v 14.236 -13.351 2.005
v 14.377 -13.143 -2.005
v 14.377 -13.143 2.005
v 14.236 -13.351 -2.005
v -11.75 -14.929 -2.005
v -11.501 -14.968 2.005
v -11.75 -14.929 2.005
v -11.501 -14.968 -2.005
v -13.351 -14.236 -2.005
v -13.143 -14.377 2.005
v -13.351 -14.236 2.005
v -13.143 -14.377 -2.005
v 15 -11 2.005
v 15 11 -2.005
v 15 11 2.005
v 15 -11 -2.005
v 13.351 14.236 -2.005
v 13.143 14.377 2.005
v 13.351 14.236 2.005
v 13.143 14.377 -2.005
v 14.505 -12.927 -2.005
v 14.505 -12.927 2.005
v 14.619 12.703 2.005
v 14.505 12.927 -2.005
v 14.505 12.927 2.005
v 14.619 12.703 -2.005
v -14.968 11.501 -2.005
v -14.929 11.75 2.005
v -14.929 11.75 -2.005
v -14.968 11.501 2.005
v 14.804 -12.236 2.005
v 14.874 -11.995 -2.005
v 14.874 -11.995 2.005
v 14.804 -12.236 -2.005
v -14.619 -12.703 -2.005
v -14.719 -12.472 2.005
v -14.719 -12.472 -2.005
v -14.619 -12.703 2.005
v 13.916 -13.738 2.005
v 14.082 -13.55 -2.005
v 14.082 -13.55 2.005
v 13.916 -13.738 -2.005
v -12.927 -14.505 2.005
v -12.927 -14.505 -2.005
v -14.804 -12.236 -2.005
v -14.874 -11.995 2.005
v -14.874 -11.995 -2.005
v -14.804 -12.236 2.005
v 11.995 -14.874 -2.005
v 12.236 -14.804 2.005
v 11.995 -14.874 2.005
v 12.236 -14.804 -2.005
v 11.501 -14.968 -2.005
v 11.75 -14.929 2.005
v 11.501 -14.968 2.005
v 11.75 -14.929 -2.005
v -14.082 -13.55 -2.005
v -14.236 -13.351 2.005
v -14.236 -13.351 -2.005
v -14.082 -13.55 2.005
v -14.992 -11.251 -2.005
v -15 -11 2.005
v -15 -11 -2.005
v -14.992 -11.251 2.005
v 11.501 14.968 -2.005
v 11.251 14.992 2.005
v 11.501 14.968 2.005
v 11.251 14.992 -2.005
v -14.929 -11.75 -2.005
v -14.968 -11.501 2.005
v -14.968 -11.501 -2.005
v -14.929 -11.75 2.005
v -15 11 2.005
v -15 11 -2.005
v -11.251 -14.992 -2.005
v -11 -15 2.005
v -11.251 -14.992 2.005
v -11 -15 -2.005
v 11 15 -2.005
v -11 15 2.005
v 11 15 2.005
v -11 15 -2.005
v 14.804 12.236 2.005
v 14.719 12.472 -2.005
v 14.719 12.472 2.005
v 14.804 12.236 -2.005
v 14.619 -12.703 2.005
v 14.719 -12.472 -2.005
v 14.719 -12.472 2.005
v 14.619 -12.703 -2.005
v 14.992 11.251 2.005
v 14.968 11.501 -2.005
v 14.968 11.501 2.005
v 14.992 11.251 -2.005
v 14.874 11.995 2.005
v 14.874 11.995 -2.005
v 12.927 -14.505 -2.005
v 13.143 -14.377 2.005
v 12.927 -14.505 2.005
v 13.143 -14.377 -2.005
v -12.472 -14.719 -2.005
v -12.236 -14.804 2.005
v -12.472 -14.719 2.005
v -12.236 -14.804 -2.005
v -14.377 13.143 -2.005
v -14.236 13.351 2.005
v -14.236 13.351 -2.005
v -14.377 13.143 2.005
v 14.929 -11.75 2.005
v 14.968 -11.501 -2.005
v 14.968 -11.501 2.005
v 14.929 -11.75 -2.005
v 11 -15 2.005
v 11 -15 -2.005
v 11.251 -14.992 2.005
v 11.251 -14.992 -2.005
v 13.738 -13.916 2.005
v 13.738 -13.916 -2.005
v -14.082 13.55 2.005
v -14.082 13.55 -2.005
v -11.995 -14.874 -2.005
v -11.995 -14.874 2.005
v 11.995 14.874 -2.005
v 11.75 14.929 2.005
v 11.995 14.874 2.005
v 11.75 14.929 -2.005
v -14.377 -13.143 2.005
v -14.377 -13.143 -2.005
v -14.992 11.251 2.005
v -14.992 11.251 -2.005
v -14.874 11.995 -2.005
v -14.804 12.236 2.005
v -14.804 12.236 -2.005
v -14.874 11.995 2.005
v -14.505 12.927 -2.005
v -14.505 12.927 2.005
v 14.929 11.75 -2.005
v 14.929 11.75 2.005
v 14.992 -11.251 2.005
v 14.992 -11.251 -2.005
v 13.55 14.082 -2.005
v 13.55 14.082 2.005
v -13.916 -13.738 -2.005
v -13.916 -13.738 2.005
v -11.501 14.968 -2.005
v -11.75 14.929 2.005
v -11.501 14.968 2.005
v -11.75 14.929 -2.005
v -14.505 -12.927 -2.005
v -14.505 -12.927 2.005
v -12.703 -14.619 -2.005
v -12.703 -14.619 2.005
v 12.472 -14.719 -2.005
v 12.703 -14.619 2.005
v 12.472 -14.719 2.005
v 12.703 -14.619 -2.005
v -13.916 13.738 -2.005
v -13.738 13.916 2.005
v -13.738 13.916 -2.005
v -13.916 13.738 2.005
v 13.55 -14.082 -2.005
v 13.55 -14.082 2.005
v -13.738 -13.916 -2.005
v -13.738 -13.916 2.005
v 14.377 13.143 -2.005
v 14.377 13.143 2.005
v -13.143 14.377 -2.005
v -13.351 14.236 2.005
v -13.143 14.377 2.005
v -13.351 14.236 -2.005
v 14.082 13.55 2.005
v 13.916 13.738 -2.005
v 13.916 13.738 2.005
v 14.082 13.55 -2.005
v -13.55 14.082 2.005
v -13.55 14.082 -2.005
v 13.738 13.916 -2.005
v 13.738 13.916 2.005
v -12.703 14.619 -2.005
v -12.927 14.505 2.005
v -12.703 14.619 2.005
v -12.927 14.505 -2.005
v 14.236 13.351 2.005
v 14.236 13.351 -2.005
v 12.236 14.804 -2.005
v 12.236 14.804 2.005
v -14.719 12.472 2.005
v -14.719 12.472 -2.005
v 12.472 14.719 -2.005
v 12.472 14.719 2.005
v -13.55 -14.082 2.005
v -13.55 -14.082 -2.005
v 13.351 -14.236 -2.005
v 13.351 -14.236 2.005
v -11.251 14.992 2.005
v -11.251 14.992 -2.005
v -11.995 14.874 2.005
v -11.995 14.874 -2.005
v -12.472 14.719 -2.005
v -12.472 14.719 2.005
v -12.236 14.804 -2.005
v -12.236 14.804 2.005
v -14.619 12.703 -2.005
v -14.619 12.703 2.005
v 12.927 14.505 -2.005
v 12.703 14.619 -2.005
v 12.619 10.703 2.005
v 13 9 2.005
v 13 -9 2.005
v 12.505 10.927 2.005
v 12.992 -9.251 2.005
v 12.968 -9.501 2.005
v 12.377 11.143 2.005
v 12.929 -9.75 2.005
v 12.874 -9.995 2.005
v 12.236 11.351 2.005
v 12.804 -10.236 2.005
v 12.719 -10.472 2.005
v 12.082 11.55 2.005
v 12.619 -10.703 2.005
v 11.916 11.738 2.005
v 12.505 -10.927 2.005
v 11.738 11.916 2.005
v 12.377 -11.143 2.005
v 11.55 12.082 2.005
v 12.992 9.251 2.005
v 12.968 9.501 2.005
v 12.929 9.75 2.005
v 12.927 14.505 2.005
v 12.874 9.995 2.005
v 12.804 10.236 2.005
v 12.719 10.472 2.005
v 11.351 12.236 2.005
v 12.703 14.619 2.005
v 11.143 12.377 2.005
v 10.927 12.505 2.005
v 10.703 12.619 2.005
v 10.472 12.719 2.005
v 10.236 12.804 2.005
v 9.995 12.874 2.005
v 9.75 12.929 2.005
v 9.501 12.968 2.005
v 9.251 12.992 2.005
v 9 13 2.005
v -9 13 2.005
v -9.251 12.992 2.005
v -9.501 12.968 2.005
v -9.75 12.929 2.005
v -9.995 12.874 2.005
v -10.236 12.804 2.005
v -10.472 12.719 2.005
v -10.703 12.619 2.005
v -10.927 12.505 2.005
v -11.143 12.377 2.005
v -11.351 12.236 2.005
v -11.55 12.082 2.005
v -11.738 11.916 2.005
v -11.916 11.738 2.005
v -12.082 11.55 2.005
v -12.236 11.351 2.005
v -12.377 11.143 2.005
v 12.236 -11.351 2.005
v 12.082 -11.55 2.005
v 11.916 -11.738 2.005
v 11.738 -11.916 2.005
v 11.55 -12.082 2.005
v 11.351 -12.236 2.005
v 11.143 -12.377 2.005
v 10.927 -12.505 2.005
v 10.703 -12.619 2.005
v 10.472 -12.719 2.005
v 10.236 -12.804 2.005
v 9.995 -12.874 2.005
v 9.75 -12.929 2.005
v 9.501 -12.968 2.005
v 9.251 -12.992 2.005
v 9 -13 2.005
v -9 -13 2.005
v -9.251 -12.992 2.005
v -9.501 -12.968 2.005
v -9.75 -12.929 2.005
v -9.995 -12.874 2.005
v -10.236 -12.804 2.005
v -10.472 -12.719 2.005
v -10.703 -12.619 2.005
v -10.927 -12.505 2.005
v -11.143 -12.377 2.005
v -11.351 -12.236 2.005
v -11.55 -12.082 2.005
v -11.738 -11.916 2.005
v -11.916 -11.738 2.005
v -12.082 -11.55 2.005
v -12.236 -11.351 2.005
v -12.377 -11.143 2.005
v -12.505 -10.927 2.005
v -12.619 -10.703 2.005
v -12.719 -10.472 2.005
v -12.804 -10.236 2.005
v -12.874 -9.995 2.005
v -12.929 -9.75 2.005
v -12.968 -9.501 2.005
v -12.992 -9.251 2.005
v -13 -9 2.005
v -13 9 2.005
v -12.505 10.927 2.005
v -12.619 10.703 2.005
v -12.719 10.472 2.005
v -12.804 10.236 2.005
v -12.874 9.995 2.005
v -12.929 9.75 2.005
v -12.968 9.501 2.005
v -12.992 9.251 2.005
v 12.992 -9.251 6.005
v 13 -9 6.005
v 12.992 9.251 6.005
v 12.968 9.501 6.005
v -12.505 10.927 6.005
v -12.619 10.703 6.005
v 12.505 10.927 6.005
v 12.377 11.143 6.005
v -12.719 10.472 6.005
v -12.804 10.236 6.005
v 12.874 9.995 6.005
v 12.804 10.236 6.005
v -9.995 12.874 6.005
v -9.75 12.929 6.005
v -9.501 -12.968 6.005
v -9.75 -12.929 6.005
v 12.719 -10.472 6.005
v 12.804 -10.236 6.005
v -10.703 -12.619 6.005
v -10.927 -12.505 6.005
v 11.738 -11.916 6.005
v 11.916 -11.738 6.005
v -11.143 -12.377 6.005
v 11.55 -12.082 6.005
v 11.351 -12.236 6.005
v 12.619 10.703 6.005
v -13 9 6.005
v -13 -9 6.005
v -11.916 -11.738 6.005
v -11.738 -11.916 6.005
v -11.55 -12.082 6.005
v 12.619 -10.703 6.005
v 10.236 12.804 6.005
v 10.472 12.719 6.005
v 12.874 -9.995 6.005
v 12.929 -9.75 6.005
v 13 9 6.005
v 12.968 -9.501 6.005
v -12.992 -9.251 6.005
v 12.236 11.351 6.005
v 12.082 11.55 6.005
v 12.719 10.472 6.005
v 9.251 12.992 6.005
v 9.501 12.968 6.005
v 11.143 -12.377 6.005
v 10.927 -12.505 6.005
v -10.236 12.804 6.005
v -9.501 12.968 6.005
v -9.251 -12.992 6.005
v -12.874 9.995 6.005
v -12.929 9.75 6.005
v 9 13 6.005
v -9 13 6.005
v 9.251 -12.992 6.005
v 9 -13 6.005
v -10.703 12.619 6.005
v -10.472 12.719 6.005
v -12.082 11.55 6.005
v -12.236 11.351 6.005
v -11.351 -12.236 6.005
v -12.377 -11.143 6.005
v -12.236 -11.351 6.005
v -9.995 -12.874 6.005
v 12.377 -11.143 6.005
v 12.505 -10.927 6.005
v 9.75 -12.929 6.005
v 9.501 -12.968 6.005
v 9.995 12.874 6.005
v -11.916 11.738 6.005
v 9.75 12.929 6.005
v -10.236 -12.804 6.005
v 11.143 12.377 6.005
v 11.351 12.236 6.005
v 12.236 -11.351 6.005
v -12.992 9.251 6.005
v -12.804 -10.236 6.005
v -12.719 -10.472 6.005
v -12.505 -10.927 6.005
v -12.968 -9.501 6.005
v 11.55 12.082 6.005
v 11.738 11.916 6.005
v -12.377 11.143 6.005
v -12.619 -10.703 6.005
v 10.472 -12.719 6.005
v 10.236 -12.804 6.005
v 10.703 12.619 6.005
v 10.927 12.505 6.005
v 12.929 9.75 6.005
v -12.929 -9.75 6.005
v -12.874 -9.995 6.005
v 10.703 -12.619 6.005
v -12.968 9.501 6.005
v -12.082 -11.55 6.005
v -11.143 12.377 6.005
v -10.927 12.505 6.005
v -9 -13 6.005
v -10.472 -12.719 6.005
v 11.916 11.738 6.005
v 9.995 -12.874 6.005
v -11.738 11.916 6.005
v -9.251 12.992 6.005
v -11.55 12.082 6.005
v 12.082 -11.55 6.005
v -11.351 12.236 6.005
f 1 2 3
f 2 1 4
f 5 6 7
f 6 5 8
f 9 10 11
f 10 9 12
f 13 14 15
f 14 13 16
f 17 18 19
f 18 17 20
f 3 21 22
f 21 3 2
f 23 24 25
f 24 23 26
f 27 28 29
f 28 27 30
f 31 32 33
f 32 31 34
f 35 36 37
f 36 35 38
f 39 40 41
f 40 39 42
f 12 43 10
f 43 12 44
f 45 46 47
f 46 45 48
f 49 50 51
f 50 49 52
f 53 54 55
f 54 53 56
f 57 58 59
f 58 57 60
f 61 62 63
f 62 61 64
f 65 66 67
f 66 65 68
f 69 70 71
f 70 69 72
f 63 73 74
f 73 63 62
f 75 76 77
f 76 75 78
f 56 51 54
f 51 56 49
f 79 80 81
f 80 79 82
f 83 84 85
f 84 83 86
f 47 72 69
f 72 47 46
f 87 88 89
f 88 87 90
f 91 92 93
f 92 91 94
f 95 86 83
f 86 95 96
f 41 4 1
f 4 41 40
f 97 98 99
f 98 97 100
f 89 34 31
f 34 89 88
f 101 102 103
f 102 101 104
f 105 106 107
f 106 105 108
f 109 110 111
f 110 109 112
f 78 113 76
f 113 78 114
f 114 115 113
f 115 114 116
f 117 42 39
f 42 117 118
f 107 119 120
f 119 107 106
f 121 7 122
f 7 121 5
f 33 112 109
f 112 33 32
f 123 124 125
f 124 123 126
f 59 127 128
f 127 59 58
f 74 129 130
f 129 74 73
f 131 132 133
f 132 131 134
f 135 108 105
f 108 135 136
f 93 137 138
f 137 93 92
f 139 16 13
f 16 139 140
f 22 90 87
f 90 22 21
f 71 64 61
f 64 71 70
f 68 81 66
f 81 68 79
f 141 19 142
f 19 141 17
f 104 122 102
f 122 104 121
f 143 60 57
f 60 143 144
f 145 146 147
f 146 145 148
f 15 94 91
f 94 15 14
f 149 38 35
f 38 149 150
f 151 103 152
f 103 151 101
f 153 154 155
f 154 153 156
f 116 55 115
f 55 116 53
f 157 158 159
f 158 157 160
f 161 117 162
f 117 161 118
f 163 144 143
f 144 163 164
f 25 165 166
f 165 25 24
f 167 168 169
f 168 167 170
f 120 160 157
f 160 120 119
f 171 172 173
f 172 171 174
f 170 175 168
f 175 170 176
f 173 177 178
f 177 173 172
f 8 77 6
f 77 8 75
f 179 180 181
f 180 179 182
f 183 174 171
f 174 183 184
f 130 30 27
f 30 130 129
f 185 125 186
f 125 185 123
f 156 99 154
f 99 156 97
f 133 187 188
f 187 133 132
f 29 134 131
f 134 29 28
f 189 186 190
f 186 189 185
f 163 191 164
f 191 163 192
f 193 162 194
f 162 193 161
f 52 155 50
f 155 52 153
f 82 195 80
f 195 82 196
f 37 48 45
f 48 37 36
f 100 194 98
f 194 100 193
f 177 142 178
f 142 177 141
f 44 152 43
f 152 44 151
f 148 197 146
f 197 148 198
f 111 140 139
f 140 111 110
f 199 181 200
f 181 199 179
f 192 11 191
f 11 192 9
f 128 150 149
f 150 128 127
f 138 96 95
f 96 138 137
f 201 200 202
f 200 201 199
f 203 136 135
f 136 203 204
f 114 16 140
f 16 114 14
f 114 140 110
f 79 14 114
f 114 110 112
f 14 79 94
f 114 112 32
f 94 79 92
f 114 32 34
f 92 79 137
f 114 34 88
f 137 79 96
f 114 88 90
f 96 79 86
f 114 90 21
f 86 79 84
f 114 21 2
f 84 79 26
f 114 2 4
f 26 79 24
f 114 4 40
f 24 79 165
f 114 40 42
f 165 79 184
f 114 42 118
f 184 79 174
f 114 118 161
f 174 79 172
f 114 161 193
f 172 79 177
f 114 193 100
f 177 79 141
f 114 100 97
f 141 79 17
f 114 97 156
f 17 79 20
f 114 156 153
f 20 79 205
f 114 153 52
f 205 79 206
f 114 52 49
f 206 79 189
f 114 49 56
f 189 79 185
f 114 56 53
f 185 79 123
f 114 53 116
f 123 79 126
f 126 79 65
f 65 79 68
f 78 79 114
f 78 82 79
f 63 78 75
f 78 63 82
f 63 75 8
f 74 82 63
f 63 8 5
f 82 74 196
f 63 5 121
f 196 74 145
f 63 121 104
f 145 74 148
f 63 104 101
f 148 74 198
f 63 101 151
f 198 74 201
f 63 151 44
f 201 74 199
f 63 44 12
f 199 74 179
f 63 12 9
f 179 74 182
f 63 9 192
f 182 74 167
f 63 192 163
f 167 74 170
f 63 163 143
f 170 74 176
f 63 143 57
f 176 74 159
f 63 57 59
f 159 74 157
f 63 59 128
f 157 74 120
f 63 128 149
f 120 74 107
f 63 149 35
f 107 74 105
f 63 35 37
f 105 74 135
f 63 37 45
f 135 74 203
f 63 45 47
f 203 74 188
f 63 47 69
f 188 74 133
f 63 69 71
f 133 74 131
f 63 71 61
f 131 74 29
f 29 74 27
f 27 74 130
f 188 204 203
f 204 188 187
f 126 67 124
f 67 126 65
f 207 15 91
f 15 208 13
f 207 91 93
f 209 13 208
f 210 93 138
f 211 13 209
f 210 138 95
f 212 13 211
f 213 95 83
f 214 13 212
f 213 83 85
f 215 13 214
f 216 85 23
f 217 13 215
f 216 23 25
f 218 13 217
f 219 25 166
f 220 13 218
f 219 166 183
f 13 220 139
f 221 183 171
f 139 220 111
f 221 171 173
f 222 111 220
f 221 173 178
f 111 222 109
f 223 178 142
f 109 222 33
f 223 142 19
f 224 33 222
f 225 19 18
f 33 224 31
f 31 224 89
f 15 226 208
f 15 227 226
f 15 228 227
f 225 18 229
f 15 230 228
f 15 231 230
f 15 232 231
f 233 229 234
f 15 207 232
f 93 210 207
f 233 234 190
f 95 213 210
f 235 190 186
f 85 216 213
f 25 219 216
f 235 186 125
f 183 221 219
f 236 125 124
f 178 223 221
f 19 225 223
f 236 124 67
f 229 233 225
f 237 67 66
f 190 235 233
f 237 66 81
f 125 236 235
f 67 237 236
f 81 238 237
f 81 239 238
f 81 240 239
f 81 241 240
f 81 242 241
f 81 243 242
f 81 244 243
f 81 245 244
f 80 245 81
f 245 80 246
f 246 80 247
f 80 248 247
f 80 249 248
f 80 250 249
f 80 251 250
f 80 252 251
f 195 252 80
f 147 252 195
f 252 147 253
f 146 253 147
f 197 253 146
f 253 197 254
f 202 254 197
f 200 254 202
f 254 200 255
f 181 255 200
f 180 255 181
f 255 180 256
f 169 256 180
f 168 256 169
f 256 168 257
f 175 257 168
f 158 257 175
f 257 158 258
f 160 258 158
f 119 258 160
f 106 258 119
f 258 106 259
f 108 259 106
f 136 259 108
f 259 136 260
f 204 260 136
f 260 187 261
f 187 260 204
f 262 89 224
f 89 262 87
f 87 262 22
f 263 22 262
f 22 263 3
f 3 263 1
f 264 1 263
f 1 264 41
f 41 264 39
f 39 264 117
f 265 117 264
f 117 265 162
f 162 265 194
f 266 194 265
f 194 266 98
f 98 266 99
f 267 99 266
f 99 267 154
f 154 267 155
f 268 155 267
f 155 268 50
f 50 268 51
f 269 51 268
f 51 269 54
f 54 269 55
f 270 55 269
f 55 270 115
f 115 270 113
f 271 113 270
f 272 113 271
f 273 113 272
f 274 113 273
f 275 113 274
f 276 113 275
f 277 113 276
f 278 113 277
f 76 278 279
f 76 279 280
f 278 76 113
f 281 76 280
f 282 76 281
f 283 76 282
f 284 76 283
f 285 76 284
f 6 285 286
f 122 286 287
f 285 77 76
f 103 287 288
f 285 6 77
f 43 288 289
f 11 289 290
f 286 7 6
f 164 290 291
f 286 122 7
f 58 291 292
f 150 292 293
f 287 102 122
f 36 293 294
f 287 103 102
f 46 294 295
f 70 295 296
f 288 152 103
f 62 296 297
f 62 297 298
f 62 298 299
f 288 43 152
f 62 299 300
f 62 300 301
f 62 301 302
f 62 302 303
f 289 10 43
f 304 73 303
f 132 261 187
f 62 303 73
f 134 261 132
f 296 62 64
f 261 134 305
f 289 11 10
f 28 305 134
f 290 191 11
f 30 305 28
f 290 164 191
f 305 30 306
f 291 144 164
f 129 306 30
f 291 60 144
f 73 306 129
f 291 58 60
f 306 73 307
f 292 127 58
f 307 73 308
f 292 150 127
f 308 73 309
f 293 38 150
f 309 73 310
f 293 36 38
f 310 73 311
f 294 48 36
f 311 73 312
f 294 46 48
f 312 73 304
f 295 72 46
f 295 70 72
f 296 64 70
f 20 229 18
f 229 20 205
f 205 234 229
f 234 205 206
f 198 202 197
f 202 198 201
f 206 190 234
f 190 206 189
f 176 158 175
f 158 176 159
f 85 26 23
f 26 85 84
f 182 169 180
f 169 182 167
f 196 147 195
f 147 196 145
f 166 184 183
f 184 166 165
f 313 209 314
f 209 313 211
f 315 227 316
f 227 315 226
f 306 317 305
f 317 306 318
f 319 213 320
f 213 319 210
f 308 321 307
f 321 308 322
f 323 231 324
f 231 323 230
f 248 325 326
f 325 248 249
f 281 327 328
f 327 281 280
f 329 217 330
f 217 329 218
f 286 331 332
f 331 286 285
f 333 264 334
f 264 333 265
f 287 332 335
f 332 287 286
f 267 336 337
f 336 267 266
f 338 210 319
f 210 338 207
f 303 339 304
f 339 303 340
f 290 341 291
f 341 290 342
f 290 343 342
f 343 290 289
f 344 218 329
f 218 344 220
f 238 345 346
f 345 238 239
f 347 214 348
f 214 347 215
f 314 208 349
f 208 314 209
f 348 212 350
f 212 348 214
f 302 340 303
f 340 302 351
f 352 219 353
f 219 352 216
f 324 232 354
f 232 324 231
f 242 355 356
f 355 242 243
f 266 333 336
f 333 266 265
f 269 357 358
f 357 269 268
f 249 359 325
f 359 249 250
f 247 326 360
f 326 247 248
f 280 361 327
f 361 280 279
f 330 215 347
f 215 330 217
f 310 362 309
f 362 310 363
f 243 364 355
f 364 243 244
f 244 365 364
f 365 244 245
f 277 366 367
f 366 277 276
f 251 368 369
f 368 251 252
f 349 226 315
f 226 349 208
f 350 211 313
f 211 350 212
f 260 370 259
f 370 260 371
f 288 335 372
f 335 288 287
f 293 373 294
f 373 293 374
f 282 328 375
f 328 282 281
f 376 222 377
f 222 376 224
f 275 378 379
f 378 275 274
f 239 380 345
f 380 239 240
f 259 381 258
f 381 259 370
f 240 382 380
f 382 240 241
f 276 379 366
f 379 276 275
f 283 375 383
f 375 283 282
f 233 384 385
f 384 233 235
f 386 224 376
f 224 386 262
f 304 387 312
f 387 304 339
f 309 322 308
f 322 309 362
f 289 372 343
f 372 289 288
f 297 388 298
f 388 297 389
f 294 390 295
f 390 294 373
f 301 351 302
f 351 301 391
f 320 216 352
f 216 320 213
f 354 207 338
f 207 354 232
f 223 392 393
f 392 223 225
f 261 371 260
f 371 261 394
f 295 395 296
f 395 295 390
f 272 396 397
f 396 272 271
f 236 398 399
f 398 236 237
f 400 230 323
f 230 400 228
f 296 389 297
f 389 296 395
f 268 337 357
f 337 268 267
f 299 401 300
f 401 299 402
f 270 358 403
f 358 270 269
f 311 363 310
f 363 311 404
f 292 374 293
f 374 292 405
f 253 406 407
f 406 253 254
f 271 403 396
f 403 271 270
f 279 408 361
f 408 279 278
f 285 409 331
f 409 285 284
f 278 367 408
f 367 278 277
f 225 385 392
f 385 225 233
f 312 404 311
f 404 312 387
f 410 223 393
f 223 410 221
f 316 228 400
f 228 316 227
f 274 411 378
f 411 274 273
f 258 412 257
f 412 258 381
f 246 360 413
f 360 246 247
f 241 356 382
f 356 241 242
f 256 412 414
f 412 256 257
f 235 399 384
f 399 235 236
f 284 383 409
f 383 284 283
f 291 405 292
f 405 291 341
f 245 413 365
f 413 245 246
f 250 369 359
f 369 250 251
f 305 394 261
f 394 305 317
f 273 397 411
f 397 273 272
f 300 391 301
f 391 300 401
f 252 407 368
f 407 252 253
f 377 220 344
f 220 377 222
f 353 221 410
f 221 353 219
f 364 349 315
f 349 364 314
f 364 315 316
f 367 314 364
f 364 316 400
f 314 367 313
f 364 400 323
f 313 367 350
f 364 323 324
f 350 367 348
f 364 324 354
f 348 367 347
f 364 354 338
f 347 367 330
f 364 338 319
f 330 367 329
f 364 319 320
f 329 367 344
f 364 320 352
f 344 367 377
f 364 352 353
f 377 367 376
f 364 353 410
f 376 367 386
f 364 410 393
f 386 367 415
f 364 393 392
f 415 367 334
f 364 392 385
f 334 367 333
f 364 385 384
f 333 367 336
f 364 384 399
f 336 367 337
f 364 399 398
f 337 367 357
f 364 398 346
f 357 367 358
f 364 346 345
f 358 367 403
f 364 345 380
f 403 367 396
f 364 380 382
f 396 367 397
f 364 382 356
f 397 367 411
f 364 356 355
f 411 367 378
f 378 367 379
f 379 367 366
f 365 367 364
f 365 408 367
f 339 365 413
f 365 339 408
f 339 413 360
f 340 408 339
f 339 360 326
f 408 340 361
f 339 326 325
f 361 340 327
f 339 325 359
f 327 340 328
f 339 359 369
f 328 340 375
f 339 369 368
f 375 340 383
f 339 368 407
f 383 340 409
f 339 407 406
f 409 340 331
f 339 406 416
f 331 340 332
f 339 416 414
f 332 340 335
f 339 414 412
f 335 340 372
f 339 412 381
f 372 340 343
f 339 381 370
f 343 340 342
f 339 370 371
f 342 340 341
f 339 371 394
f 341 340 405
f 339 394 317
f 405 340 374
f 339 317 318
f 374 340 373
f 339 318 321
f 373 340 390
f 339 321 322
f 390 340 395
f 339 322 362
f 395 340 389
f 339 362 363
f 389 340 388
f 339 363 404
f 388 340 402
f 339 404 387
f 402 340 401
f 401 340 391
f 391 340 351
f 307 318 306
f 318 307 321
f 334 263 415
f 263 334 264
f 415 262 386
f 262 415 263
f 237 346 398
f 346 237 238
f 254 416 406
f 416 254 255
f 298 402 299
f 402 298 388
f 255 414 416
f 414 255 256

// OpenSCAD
// paramètres
width = 30; //[1:1:40]
length = 30; //[1:1:40]
baseHeight = 4; //[1:1:11]
buttonHeight = 3; //[1:1:10]
borderThickness = 2; //[1:1:4]
cornerRadius = 4; //[1:1:12]
detail = 100; //[4:1:100]

$fn = detail; // niveau détail

    // module bouton
module floorButton(w, l, hBase, hButton, border, r)
{
    // base
    color("gray")
    roundedBox(w, l, hBase, r);

    // surface bouton
    color("red")
    translate([0, 0, 4])
    roundedBox(w - 2*border, l - 2*border, hButton+1, r/1);
}

// boîte arrondie simple
module roundedBox(w, l, h, r)
{
    minkowski()
    {
        cube([w - 2*r, l - 2*r, h], center = true);
        cylinder(r = r, h = 0.01, center = true);
    }
}

// affichage
floorButton(width, length, baseHeight, buttonHeight, borderThickness, cornerRadius);
